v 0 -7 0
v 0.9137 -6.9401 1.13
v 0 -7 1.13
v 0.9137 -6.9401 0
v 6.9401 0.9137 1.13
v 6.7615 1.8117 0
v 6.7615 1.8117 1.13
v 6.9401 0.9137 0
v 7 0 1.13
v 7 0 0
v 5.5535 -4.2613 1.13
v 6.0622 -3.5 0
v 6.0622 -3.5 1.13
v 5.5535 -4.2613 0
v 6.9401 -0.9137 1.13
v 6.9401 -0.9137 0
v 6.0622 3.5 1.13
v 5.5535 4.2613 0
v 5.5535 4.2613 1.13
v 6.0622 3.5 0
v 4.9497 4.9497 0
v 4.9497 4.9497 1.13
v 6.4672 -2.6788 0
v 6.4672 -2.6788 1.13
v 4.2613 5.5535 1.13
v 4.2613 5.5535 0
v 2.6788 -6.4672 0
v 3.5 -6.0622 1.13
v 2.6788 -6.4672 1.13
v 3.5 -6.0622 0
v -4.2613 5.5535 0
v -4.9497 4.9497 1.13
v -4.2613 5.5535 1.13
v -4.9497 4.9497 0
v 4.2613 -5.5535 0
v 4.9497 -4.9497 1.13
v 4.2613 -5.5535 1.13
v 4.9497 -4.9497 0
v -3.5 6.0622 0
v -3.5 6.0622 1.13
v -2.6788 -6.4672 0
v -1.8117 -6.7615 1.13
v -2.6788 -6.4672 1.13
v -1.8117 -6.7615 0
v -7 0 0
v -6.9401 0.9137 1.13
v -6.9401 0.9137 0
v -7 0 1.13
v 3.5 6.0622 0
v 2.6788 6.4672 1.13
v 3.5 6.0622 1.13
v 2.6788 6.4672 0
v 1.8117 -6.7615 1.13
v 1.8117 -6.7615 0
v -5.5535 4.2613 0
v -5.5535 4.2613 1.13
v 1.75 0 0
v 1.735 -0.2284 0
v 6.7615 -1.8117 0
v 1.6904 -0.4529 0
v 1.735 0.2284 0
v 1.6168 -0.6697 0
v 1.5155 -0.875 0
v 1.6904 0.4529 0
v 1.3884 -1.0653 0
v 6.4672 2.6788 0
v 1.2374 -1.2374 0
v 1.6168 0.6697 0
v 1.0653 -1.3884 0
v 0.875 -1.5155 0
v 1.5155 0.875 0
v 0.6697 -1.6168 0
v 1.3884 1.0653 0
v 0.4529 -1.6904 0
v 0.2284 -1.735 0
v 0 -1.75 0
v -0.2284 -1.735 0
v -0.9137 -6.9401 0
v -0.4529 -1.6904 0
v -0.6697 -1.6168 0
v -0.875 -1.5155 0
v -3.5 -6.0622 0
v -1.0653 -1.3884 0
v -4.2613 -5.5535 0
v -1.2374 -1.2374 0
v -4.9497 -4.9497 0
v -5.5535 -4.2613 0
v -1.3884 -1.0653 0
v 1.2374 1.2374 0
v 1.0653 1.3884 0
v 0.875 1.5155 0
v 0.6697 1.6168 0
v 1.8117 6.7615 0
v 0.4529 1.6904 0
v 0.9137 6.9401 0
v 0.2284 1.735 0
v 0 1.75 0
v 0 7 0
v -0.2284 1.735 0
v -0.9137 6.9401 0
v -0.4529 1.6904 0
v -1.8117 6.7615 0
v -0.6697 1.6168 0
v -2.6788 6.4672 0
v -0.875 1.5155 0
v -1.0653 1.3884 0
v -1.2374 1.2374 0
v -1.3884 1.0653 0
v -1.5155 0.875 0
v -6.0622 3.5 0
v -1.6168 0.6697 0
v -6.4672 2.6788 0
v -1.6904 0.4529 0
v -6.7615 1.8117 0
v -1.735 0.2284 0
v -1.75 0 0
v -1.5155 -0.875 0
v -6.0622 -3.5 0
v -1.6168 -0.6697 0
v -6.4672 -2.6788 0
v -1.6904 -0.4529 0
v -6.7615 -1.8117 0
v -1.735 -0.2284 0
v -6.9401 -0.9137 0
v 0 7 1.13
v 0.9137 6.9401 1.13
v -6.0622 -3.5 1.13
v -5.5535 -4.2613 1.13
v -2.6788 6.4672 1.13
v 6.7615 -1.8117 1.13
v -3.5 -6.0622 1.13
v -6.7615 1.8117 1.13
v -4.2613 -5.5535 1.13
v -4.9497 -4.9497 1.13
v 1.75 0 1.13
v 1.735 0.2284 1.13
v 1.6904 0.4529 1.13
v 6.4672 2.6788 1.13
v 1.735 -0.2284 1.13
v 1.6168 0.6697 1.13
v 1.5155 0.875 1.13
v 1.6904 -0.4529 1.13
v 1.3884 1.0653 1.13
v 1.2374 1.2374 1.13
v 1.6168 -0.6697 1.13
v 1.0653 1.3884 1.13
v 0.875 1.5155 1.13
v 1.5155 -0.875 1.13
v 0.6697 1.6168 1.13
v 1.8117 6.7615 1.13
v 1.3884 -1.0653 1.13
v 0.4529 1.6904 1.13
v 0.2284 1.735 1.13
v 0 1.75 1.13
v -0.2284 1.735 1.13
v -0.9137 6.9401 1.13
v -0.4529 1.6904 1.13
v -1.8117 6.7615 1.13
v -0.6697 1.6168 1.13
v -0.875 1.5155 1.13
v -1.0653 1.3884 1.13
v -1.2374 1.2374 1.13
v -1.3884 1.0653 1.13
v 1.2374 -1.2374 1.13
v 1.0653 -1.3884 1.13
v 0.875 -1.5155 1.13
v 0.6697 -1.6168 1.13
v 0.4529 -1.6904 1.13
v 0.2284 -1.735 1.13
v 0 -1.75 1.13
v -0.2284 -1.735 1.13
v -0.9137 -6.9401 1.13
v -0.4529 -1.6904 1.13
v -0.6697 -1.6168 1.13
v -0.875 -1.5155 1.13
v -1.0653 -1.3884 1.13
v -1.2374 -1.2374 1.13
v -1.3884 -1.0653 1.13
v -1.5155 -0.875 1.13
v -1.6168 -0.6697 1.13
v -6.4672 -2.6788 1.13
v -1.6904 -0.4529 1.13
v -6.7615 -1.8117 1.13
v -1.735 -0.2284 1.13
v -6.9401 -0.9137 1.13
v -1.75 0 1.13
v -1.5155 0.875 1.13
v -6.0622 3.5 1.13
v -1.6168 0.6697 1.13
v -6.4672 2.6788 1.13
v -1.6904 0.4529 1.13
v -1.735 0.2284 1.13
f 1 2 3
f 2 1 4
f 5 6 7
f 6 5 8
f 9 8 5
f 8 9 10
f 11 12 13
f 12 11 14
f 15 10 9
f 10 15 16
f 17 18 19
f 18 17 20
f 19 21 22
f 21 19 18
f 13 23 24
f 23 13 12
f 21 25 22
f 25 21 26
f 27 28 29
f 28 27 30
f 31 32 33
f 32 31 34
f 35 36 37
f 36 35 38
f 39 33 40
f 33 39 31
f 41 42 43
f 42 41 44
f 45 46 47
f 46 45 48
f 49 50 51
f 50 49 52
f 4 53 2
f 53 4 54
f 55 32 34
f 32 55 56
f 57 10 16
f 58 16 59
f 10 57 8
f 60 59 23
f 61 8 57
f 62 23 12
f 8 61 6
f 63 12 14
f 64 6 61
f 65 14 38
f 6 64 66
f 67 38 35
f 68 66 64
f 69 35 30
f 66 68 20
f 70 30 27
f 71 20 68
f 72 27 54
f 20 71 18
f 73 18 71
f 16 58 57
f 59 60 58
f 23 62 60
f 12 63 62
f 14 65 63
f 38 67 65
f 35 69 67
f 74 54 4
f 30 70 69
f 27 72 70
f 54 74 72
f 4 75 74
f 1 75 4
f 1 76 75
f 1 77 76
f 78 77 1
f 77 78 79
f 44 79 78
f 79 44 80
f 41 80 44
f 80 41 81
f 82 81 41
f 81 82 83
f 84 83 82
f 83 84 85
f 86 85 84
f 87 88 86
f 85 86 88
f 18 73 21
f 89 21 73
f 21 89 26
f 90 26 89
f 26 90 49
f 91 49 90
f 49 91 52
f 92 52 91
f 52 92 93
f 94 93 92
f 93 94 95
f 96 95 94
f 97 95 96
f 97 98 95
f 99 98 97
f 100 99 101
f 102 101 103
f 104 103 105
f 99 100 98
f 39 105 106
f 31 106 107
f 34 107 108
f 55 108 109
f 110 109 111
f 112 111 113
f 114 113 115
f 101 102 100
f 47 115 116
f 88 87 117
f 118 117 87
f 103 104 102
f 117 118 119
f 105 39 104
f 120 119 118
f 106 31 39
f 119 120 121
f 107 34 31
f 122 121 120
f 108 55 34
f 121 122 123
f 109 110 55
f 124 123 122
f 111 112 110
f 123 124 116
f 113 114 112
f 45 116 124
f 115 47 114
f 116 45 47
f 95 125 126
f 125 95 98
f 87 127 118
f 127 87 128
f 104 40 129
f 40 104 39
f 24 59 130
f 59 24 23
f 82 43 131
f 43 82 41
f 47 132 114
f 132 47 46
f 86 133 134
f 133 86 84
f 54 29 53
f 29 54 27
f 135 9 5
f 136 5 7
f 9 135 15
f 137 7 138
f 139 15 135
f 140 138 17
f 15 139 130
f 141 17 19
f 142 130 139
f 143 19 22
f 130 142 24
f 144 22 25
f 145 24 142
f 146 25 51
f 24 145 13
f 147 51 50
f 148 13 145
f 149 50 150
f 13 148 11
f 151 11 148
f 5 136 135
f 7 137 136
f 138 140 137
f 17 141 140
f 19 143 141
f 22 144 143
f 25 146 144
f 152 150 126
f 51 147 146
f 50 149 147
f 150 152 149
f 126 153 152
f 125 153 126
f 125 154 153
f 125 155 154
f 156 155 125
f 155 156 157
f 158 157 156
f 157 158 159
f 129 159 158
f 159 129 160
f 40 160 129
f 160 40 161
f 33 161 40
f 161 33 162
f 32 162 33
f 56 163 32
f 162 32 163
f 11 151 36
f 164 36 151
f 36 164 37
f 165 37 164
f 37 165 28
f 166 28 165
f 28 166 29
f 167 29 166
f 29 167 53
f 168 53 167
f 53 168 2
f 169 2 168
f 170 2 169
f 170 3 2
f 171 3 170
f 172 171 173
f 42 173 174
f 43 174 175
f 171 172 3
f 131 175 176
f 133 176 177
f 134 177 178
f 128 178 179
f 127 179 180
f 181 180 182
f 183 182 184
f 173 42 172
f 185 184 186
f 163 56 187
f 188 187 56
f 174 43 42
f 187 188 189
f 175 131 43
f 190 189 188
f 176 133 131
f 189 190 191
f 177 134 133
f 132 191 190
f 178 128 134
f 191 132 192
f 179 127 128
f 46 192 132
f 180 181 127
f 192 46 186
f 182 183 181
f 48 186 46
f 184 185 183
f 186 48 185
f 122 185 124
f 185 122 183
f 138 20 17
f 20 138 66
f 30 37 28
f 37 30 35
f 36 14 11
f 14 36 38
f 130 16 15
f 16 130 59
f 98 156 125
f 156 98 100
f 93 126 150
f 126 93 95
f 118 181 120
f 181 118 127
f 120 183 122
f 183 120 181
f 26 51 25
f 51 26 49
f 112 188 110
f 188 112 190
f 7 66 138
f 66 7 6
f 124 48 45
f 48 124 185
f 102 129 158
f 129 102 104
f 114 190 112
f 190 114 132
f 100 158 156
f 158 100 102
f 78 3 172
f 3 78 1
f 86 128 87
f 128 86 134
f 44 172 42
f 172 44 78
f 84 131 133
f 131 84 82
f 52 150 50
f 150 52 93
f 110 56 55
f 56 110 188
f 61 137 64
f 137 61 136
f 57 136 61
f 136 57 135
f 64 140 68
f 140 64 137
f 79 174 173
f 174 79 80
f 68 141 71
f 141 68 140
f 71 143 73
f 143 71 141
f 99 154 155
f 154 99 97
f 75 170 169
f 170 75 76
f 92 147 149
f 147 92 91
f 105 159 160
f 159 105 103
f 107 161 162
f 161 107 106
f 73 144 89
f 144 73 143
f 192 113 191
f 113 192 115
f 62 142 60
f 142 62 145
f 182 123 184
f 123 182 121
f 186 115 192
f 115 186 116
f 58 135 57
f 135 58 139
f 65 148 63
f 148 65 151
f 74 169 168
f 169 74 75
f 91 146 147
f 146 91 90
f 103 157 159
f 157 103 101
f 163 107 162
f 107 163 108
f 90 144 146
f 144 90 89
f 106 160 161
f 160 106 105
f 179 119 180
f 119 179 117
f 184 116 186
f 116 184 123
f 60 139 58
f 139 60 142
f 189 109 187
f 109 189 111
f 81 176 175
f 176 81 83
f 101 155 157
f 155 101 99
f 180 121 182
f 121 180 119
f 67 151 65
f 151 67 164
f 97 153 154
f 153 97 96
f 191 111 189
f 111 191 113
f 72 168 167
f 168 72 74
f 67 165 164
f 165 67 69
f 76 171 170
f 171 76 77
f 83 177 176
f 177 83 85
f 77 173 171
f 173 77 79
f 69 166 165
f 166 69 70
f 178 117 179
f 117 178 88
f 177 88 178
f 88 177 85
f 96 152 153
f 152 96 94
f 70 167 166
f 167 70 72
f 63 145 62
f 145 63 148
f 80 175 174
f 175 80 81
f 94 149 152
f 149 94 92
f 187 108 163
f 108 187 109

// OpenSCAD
// file: parameters.scad
// =============================================================================
// Gen-AT Dual-rotor copper-centroid hypermicro AFPM - WOUND-AWARE (HARD GATE)
// PRIMARY challenger vs Gen-AQ. Magnets @ R=38.5 + 210 t + former_web 1.22 -> m2m 4.68.
// =============================================================================

// --- Wire / wind budget (26 AWG, ~1 lb spool ~ 390 m bare-equiv) --------------
wire_awg            = 26;
wire_od             = 0.45;     // insulated OD mm
turns               = 210;      // +5 vs Gen-AQ 205
fill                = 0.70;
layers_per_face     = 2;        // axial layers proud of EACH flange
wind_build_axial    = layers_per_face * wire_od * fill;   // 0.63 mm
wind_build_radial   = 3 * wire_od * fill;                 // 0.945 mm

// --- Pancake former (bare STL) -----------------------------------------------
coil_id_r           = 14.5;     // copper-centroid window centered ~R=38.5
coil_od_r           = 62.5;
span_deg            = 26.0;     // 12 stations x 30 deg pitch
former_web          = 1.22;     // thinner vs AQ 1.25 (print-safe >=1.20 LB)
flange_t            = 0.60;
wall                = 1.2;
slot_w              = 2.4;
mount_hole          = 3.5;
tab_len             = 7.0;

former_bare_h       = former_web + 2 * flange_t;            // 2.42 mm
coil_envelope_h     = former_bare_h + 2 * wind_build_axial; // 3.68 mm

// --- Running clearance (magnet face -> WOUND face) EACH side ------------------
run_clear           = 0.50;     // PASS floor >= 0.5
gap_spacer_h        = run_clear + wind_build_axial;         // 1.13 mm
m2m                 = coil_envelope_h + 2 * run_clear;      // 4.68 mm (beats Gen-AQ 4.71)

// --- Mid stator (12 pancakes 3ph; winds proud both faces) ---------------------
coil_stations       = 12;
bay_r_in            = coil_id_r - 2.0 - wind_build_radial;
bay_r_out           = coil_od_r + 2.0 + wind_build_radial;
bay_span            = span_deg + 4.0;
bay_offset          = 2.0;
stator_thick        = former_bare_h;                        // winds proud +/-Z
stator_od           = 160.0;
shaft_clear_stator  = 34.0;
coil_mount_r        = 25.0;

// --- Rotors (x2) - 8xO20 @ R=38.5 (copper centroid) + 24xO5 Halbach ----------
large_pocket_d      = 20.3;
small_pocket_d      = 5.3;
pocket_h            = 5.2;
large_n             = 8;
R_large             = 38.5;     // covers ~28.5-48.5 over copper centroid ~38.5
R_small_inner       = 23.5;
R_small_mid         = 38.5;
R_small_outer       = 55.5;
carrier_od          = 156.0;
carrier_thick       = 7.5;
hub_h               = 10.0;
hub_od              = 30.0;
rotor_b_offset_deg  = 22.5;

// --- Modular MAX interface (Gen-E family) ------------------------------------
shaft_bore          = 8.35;
bearing_d           = 21.85;
bearing_h           = 7.2;
m3_clear            = 3.5;
bolt_r_inner        = 36.0;
bolt_n_inner        = 6;
flange_bolt_r       = 72.0;
flange_bolt_n       = 6;
brace_r             = 68.0;
brace_d             = 4.3;
brace_n             = 4;

spacer_pad_od       = 14.0;
spacer_pad_id       = m3_clear;
endbell_od          = 160.0;
endbell_thick       = 8.0;
endbell_shaft_clear = 10.0;

$fn = 64;
// main file
// Gen-AT gap spacer — h = run_clear + wind_build_axial
include <parameters.scad>;
$fn = 48;
difference() {
    cylinder(d=spacer_pad_od, h=gap_spacer_h);
    translate([0, 0, -0.1]) cylinder(d=spacer_pad_id, h=gap_spacer_h + 0.2);
}
